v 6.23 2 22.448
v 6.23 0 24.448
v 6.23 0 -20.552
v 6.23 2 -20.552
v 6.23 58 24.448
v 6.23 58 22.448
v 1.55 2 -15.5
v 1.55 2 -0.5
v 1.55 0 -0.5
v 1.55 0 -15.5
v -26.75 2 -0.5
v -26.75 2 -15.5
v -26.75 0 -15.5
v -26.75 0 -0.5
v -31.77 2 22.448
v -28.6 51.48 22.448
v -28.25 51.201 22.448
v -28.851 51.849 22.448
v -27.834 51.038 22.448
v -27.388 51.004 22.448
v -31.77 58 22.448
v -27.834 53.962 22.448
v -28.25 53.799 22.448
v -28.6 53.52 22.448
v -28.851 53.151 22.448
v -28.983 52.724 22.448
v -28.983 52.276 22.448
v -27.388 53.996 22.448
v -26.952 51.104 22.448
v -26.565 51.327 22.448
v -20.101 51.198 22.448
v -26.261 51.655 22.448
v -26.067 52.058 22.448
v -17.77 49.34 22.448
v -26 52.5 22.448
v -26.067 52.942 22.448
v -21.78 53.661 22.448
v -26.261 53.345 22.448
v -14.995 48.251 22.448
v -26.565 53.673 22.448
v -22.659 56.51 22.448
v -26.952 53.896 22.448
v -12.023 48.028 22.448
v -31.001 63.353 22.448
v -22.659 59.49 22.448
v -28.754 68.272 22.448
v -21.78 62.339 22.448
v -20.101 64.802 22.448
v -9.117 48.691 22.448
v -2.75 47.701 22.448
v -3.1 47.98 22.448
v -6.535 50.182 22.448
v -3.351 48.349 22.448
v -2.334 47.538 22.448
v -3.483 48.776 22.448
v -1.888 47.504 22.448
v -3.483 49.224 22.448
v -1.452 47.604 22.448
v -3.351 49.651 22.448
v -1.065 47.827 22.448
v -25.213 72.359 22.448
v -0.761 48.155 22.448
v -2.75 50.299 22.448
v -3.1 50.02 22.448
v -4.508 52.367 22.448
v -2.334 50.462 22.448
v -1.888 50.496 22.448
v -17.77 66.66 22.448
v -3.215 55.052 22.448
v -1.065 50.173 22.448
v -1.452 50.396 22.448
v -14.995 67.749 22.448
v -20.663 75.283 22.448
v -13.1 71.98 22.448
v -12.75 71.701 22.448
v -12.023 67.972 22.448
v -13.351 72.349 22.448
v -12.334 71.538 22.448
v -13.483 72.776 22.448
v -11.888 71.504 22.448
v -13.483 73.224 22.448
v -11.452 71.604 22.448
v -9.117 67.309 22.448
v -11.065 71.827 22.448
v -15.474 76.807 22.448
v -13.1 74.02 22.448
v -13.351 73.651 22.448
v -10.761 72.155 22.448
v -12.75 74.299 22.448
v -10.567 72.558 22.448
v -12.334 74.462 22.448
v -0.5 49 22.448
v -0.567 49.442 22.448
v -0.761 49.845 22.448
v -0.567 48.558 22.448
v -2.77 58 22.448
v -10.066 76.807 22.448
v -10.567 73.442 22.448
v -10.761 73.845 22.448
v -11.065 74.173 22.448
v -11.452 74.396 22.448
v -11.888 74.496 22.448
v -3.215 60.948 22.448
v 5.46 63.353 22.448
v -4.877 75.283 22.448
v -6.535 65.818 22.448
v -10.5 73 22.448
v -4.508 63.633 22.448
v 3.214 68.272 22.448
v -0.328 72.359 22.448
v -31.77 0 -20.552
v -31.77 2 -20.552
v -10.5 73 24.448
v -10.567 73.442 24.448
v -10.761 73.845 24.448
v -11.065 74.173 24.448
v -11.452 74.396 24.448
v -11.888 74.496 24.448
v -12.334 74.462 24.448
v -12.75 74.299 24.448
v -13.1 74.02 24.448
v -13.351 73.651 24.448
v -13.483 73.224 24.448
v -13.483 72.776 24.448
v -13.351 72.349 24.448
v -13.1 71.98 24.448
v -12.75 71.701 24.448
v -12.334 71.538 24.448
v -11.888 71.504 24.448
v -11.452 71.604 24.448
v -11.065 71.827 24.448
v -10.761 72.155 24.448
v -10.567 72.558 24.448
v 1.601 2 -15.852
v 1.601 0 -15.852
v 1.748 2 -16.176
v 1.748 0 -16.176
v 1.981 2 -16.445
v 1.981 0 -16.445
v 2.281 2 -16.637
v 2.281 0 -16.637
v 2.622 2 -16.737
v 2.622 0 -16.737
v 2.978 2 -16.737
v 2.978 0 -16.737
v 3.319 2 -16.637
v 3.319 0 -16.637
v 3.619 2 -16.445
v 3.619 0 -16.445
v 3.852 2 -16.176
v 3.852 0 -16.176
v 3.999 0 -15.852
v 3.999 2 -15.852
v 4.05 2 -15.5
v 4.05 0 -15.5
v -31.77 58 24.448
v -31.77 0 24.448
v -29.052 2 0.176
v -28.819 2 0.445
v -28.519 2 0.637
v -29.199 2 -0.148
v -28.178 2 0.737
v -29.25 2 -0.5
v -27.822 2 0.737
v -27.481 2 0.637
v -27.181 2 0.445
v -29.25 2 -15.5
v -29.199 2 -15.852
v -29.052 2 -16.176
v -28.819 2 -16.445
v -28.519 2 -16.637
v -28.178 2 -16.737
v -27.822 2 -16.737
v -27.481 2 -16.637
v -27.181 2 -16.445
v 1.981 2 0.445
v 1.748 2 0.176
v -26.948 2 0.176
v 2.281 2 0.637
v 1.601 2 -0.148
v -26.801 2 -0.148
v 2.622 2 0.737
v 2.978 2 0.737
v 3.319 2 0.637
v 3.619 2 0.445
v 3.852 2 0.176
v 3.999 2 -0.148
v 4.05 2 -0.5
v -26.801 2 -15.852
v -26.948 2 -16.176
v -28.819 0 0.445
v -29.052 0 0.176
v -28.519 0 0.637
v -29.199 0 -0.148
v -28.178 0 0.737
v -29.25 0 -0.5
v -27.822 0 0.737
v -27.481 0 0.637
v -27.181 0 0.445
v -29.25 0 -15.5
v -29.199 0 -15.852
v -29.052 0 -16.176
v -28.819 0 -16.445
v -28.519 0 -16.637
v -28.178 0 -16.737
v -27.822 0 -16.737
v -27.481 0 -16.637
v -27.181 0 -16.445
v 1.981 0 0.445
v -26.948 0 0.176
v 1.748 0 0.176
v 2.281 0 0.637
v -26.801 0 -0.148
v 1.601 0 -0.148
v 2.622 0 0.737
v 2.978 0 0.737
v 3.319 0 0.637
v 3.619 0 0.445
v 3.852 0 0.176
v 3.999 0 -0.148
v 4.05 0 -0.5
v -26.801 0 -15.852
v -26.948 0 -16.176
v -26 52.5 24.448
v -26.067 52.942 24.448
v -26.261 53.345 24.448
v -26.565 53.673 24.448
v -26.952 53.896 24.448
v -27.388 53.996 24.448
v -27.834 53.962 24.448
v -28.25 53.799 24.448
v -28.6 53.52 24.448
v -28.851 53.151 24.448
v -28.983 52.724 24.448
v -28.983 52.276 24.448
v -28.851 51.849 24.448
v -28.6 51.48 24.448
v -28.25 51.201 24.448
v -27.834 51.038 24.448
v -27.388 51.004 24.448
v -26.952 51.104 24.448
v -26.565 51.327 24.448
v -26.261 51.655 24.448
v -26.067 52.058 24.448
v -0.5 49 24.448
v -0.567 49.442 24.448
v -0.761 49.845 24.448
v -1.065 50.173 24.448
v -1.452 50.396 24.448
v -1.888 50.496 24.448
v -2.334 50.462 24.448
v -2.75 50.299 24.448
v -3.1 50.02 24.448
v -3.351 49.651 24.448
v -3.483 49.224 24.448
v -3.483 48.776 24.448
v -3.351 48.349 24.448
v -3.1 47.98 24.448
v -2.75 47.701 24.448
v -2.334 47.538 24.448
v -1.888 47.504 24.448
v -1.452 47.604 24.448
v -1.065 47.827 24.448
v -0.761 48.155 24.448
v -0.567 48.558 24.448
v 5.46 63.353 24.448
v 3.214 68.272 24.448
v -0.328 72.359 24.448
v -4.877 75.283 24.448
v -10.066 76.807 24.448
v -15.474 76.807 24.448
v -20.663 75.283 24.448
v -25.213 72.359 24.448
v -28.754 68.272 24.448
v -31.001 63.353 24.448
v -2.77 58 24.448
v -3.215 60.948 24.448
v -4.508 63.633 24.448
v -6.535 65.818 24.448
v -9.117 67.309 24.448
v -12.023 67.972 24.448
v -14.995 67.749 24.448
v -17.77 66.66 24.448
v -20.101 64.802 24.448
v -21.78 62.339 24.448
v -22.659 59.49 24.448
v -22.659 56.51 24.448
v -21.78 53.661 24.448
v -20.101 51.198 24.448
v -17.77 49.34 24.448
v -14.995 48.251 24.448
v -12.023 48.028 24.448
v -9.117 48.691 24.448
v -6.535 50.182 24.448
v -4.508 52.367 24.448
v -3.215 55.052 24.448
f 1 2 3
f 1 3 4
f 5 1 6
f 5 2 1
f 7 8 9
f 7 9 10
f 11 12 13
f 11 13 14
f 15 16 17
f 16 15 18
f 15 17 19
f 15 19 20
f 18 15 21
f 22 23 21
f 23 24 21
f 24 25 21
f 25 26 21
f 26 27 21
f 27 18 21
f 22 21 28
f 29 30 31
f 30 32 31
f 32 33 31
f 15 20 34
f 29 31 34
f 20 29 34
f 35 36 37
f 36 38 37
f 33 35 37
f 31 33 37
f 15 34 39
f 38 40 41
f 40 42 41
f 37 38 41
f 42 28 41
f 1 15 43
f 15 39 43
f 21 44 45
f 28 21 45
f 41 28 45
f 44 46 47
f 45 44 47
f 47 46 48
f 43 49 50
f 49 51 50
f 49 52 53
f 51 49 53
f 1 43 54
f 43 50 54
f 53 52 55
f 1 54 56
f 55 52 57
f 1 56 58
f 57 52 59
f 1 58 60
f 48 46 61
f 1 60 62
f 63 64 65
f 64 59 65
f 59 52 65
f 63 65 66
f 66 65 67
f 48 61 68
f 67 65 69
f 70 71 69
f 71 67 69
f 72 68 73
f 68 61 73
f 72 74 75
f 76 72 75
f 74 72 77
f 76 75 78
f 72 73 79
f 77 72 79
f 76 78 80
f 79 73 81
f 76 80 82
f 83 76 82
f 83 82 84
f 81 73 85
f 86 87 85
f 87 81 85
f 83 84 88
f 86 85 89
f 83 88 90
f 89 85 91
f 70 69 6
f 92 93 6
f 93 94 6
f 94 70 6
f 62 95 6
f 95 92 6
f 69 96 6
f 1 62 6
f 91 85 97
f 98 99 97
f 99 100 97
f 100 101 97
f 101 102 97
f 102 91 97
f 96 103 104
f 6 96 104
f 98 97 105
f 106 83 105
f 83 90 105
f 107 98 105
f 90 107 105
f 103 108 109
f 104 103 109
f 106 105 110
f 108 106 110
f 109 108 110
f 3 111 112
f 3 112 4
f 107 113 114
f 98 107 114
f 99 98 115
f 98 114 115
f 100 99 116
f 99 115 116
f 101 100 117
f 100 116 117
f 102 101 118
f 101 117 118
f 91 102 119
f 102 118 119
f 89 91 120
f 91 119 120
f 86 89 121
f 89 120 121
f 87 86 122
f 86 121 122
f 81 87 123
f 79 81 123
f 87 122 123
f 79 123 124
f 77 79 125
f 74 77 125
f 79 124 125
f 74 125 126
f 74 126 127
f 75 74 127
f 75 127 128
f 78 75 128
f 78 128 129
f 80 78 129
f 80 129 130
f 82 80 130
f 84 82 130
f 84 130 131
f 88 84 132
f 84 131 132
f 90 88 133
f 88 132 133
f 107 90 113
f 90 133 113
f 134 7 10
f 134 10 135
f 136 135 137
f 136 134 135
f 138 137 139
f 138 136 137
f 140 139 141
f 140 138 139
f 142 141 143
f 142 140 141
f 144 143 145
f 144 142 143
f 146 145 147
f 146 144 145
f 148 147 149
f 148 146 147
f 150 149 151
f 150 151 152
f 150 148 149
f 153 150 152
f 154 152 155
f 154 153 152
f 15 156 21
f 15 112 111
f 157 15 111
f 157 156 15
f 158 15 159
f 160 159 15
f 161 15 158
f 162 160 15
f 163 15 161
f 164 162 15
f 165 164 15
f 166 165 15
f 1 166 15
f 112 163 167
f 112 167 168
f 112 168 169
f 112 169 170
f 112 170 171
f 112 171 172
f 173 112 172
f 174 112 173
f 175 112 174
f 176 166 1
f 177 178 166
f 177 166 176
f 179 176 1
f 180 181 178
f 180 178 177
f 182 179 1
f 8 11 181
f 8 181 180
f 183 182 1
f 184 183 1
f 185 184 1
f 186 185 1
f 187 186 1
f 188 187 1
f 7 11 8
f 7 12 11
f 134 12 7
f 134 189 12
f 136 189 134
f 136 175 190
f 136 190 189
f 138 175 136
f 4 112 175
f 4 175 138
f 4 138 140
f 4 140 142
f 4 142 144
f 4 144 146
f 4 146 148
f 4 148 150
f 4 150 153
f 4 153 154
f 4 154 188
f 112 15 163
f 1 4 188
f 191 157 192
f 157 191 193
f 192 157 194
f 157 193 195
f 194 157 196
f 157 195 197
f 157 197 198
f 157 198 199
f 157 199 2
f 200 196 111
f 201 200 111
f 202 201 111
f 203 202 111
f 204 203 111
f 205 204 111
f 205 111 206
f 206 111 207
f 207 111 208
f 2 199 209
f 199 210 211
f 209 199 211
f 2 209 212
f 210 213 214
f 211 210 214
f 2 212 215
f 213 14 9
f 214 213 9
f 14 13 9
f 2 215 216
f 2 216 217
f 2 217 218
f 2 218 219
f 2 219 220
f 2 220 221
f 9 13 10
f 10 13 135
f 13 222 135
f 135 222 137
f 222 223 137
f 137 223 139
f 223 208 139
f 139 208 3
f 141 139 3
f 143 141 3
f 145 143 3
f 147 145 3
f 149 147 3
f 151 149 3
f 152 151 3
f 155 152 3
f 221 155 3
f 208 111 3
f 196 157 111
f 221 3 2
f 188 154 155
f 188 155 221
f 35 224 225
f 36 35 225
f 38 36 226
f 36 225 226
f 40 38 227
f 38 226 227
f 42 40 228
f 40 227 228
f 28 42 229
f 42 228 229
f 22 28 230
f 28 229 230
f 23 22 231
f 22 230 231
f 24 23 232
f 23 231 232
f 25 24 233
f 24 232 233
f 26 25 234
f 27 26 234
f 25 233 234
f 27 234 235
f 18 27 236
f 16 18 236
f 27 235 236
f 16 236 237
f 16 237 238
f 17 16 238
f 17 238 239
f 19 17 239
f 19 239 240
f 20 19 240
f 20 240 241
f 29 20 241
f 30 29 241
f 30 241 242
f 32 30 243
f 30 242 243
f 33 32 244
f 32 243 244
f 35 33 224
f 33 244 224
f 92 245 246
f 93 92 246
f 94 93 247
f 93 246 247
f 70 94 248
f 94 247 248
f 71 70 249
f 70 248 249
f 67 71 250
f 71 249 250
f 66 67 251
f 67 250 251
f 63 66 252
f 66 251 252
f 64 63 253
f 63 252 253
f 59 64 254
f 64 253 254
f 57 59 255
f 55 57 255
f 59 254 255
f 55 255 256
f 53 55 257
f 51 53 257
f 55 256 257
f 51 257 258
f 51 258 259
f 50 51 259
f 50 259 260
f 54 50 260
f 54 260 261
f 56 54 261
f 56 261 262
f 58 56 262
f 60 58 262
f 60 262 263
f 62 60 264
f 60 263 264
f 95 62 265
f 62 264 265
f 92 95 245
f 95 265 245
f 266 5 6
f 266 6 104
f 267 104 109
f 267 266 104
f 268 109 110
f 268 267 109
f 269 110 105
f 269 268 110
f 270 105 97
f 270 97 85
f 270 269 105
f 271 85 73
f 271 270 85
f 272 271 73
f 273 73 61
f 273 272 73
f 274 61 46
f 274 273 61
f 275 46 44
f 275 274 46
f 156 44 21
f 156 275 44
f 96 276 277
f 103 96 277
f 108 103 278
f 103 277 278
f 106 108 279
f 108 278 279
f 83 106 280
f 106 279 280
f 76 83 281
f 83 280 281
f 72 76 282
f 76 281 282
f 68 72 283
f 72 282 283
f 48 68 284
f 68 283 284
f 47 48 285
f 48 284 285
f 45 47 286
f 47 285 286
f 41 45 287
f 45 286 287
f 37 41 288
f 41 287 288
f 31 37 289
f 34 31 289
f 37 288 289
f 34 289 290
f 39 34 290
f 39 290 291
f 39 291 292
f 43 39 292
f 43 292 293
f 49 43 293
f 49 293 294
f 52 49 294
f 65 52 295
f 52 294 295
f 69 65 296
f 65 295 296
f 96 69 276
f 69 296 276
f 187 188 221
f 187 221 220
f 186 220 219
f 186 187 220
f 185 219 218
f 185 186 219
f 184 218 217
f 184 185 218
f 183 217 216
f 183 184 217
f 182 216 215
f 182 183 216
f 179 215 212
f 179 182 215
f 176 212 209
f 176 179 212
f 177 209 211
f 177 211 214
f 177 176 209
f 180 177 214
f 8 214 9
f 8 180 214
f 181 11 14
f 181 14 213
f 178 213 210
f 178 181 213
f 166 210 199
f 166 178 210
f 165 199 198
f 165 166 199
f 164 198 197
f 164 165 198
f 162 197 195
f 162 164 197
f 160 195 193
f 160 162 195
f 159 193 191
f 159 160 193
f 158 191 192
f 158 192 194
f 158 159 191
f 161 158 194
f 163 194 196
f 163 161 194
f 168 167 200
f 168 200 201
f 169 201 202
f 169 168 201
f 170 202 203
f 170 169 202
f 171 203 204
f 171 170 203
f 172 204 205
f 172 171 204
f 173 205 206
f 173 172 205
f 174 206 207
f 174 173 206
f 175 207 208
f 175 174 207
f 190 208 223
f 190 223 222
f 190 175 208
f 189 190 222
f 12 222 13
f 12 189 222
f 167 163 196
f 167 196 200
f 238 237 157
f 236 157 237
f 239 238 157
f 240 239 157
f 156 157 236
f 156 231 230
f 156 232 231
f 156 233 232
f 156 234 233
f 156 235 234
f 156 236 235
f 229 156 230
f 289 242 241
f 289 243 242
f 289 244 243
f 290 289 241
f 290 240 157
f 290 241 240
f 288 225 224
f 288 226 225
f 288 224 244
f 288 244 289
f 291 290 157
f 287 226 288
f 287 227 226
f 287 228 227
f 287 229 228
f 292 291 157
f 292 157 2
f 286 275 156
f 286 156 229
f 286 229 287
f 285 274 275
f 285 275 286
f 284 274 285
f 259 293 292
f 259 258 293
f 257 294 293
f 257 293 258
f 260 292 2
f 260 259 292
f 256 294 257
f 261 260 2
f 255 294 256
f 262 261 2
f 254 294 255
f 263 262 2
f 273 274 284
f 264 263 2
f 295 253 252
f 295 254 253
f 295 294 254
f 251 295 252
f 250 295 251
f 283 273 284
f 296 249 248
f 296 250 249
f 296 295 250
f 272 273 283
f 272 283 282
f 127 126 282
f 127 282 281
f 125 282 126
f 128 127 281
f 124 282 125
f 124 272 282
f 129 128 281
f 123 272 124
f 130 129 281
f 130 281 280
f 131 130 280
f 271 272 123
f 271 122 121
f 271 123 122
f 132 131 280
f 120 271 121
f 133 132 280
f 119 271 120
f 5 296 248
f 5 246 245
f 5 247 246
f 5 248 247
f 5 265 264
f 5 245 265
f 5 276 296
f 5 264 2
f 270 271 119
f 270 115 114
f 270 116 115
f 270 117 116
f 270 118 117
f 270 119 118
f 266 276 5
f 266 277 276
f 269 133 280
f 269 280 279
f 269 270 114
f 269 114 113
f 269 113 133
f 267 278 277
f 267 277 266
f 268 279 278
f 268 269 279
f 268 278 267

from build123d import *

# Parameters (mm, degrees)
SKETCH1_W           = 38
SKETCH1_H           = 45
BOSS_EXTRUDE1_DEPTH = 2
SKETCH3_R           = 19
SKETCH3_R_2         = 10
BOSS_EXTRUDE2_DEPTH = 2
BOSS_EXTRUDE3_DEPTH = 2
CUT_EXTRUDE1_DEPTH  = 2
SKETCH6_R           = 1.5
CUT_EXTRUDE2_DEPTH  = 2


with BuildPart() as part:
    # Sketch1 → Boss-Extrude1 (new body)
    with BuildSketch(Plane(origin=(0, 0, 0), x_dir=(1, 0, 0), z_dir=(0, 1, 0))):
        with Locations((-12.77026585, -1.948212393)):
            Rectangle(SKETCH1_W, SKETCH1_H)
    extrude(amount=BOSS_EXTRUDE1_DEPTH)



with BuildPart() as body_2:
    # Sketch3 → Boss-Extrude2 (new body)
    with BuildSketch(Plane.XY.offset(24.448212393)):
        with Locations((-12.77026585, 58)):
            Circle(SKETCH3_R)
        with Locations((-12.77026585, 58)):
            Circle(SKETCH3_R_2, mode=Mode.SUBTRACT)
    extrude(amount=-BOSS_EXTRUDE2_DEPTH)


with BuildPart() as part_1:
    add(part.part)

    add(body_2.part)  # Boss-Extrude3 merges body 2
    # Sketch3<4> → Boss-Extrude3 (add)
    with BuildSketch(Plane.XY.offset(24.448212393)):
        with BuildLine():
            Line((-31.77026585, 2), (6.22973415, 2))
            Line((6.22973415, 2), (6.22973415, 58))
            ThreePointArc((6.22973415, 58), (-12.77026585, 39), (-31.77026585, 58))
            Line((-31.77026585, 58), (-31.77026585, 2))
        make_face()
    extrude(amount=-BOSS_EXTRUDE3_DEPTH)

    # Sketch4 → Cut-Extrude1 (cut)
    with BuildSketch(Plane(origin=(0, 2, 0), x_dir=(1, 0, 0), z_dir=(0, 1, 0))):
        with BuildLine():
            Line((1.55, 0.5), (1.55, 15.5))
            ThreePointArc((1.55, 15.5), (2.8, 16.75), (4.05, 15.5))
            Line((4.05, 15.5), (4.05, 0.5))
            ThreePointArc((4.05, 0.5), (2.8, -0.75), (1.55, 0.5))
        make_face()
        with BuildLine():
            Line((-29.25, 0.5), (-29.25, 15.5))
            ThreePointArc((-29.25, 15.5), (-28, 16.75), (-26.75, 15.5))
            Line((-26.75, 15.5), (-26.75, 0.5))
            ThreePointArc((-26.75, 0.5), (-28, -0.75), (-29.25, 0.5))
        make_face()
    extrude(amount=-CUT_EXTRUDE1_DEPTH, mode=Mode.SUBTRACT)

    # Sketch6 → Cut-Extrude2 (cut)
    with BuildSketch(Plane.XY.offset(24.448212393)):
        with Locations((-12, 73)):
            Circle(SKETCH6_R)
        with Locations((-2, 49)):
            Circle(SKETCH6_R)
        with Locations((-27.5, 52.5)):
            Circle(SKETCH6_R)
    extrude(amount=-CUT_EXTRUDE2_DEPTH, mode=Mode.SUBTRACT)


solid = part_1.part
